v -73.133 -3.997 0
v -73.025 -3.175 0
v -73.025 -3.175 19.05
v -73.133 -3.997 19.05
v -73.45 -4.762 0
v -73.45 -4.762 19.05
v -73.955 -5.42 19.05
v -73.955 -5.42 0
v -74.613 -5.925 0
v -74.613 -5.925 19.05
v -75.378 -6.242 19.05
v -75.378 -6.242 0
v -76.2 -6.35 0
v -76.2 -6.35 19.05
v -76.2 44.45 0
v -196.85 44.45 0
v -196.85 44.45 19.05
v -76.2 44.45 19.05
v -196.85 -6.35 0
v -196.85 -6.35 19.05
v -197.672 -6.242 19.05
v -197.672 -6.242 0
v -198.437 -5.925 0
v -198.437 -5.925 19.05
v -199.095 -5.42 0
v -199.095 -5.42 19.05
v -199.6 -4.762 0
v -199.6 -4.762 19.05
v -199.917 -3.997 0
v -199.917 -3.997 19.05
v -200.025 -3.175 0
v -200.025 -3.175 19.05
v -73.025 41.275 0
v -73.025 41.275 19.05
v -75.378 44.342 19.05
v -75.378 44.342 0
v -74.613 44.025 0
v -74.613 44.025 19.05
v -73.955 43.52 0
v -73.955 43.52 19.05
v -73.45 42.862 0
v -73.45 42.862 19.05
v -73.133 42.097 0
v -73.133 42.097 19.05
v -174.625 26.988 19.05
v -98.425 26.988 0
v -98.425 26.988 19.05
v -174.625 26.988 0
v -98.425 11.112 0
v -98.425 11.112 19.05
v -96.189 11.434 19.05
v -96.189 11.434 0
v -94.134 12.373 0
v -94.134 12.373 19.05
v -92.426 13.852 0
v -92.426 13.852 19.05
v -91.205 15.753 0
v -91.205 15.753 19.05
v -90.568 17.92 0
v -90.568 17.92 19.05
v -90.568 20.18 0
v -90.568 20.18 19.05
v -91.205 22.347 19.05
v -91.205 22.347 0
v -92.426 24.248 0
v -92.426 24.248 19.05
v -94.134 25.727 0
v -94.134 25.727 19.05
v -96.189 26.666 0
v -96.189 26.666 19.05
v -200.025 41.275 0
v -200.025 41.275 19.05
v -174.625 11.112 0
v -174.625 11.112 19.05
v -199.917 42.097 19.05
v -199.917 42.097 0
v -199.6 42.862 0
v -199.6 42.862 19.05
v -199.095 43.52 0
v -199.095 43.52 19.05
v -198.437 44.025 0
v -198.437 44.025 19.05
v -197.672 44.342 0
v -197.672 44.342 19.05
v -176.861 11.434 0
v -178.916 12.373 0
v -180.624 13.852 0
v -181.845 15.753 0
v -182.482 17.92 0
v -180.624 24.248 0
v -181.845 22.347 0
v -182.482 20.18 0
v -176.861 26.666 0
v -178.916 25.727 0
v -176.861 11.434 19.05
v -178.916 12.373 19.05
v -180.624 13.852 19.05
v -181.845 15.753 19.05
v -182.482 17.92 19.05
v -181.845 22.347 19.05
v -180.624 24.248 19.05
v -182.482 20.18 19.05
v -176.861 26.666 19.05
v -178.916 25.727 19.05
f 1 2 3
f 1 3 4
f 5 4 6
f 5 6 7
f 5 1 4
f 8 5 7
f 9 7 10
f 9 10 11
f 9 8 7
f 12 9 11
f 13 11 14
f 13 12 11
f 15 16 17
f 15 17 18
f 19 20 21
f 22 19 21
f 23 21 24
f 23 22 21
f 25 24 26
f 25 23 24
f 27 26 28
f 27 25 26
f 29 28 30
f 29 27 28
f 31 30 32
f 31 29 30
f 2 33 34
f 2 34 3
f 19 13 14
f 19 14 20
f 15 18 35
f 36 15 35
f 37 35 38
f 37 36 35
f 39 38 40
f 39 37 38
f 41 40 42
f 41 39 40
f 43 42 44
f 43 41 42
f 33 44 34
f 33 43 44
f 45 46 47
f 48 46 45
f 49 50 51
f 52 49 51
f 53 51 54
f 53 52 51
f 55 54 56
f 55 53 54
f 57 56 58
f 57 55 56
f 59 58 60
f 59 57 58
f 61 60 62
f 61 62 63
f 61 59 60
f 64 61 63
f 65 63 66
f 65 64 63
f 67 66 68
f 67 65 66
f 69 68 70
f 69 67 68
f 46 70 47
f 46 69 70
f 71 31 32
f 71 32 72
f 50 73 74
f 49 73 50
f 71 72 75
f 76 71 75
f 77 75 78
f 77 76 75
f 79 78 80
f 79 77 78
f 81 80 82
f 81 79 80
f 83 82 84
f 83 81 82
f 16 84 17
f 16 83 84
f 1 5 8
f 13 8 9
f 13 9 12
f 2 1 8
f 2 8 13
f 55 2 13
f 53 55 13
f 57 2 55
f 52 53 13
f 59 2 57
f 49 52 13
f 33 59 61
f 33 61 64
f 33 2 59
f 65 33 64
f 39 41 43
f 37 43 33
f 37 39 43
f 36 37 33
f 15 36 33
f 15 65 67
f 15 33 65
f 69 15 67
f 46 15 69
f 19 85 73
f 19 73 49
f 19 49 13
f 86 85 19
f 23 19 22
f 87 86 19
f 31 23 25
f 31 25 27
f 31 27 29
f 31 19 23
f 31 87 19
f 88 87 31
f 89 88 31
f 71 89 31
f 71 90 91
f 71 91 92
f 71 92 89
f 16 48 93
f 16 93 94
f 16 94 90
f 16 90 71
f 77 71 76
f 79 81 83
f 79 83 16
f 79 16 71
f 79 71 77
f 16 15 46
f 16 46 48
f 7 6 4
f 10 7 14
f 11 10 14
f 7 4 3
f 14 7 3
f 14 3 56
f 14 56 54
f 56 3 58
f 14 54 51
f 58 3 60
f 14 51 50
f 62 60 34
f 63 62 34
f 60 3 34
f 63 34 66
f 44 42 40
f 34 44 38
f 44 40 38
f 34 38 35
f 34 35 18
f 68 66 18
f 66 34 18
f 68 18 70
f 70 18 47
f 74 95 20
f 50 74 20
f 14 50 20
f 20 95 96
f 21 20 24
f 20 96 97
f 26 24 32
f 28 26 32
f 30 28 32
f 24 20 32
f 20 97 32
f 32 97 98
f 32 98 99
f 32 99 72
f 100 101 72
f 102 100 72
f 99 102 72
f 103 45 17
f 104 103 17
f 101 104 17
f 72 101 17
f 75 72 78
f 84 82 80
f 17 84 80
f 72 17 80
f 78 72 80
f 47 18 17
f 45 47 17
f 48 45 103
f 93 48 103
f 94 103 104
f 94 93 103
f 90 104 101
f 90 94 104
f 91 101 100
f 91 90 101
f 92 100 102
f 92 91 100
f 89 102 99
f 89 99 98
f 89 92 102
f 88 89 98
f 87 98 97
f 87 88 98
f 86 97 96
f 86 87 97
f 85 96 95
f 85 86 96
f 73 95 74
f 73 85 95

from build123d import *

# Parameters (mm, degrees)
BASE_EXTRUDE_DEPTH = 19.05


with BuildPart() as part:
    # Sketch1 → Base-Extrude (new body)
    with BuildSketch(Plane.XY):
        with BuildLine():
            Line((-76.2, -6.35), (-196.85, -6.35))
            ThreePointArc((-196.85, -6.35), (-199.09506403, -5.42006403), (-200.025, -3.175))
            Line((-200.025, -3.175), (-200.025, 41.275))
            ThreePointArc((-200.025, 41.275), (-199.09506403, 43.52006403), (-196.85, 44.45))
            Line((-196.85, 44.45), (-76.2, 44.45))
            ThreePointArc((-76.2, 44.45), (-73.95493597, 43.52006403), (-73.025, 41.275))
            Line((-73.025, 41.275), (-73.025, -3.175))
            ThreePointArc((-73.025, -3.175), (-73.95493597, -5.42006403), (-76.2, -6.35))
        make_face()
        with BuildLine():
            Line((-174.625, 11.1125), (-98.425, 11.1125))
            ThreePointArc((-98.425, 11.1125), (-90.4875, 19.05), (-98.425, 26.9875))
            Line((-98.425, 26.9875), (-174.625, 26.9875))
            ThreePointArc((-174.625, 26.9875), (-182.5625, 19.05), (-174.625, 11.1125))
        make_face(mode=Mode.SUBTRACT)
    extrude(amount=BASE_EXTRUDE_DEPTH)


solid = part.part
